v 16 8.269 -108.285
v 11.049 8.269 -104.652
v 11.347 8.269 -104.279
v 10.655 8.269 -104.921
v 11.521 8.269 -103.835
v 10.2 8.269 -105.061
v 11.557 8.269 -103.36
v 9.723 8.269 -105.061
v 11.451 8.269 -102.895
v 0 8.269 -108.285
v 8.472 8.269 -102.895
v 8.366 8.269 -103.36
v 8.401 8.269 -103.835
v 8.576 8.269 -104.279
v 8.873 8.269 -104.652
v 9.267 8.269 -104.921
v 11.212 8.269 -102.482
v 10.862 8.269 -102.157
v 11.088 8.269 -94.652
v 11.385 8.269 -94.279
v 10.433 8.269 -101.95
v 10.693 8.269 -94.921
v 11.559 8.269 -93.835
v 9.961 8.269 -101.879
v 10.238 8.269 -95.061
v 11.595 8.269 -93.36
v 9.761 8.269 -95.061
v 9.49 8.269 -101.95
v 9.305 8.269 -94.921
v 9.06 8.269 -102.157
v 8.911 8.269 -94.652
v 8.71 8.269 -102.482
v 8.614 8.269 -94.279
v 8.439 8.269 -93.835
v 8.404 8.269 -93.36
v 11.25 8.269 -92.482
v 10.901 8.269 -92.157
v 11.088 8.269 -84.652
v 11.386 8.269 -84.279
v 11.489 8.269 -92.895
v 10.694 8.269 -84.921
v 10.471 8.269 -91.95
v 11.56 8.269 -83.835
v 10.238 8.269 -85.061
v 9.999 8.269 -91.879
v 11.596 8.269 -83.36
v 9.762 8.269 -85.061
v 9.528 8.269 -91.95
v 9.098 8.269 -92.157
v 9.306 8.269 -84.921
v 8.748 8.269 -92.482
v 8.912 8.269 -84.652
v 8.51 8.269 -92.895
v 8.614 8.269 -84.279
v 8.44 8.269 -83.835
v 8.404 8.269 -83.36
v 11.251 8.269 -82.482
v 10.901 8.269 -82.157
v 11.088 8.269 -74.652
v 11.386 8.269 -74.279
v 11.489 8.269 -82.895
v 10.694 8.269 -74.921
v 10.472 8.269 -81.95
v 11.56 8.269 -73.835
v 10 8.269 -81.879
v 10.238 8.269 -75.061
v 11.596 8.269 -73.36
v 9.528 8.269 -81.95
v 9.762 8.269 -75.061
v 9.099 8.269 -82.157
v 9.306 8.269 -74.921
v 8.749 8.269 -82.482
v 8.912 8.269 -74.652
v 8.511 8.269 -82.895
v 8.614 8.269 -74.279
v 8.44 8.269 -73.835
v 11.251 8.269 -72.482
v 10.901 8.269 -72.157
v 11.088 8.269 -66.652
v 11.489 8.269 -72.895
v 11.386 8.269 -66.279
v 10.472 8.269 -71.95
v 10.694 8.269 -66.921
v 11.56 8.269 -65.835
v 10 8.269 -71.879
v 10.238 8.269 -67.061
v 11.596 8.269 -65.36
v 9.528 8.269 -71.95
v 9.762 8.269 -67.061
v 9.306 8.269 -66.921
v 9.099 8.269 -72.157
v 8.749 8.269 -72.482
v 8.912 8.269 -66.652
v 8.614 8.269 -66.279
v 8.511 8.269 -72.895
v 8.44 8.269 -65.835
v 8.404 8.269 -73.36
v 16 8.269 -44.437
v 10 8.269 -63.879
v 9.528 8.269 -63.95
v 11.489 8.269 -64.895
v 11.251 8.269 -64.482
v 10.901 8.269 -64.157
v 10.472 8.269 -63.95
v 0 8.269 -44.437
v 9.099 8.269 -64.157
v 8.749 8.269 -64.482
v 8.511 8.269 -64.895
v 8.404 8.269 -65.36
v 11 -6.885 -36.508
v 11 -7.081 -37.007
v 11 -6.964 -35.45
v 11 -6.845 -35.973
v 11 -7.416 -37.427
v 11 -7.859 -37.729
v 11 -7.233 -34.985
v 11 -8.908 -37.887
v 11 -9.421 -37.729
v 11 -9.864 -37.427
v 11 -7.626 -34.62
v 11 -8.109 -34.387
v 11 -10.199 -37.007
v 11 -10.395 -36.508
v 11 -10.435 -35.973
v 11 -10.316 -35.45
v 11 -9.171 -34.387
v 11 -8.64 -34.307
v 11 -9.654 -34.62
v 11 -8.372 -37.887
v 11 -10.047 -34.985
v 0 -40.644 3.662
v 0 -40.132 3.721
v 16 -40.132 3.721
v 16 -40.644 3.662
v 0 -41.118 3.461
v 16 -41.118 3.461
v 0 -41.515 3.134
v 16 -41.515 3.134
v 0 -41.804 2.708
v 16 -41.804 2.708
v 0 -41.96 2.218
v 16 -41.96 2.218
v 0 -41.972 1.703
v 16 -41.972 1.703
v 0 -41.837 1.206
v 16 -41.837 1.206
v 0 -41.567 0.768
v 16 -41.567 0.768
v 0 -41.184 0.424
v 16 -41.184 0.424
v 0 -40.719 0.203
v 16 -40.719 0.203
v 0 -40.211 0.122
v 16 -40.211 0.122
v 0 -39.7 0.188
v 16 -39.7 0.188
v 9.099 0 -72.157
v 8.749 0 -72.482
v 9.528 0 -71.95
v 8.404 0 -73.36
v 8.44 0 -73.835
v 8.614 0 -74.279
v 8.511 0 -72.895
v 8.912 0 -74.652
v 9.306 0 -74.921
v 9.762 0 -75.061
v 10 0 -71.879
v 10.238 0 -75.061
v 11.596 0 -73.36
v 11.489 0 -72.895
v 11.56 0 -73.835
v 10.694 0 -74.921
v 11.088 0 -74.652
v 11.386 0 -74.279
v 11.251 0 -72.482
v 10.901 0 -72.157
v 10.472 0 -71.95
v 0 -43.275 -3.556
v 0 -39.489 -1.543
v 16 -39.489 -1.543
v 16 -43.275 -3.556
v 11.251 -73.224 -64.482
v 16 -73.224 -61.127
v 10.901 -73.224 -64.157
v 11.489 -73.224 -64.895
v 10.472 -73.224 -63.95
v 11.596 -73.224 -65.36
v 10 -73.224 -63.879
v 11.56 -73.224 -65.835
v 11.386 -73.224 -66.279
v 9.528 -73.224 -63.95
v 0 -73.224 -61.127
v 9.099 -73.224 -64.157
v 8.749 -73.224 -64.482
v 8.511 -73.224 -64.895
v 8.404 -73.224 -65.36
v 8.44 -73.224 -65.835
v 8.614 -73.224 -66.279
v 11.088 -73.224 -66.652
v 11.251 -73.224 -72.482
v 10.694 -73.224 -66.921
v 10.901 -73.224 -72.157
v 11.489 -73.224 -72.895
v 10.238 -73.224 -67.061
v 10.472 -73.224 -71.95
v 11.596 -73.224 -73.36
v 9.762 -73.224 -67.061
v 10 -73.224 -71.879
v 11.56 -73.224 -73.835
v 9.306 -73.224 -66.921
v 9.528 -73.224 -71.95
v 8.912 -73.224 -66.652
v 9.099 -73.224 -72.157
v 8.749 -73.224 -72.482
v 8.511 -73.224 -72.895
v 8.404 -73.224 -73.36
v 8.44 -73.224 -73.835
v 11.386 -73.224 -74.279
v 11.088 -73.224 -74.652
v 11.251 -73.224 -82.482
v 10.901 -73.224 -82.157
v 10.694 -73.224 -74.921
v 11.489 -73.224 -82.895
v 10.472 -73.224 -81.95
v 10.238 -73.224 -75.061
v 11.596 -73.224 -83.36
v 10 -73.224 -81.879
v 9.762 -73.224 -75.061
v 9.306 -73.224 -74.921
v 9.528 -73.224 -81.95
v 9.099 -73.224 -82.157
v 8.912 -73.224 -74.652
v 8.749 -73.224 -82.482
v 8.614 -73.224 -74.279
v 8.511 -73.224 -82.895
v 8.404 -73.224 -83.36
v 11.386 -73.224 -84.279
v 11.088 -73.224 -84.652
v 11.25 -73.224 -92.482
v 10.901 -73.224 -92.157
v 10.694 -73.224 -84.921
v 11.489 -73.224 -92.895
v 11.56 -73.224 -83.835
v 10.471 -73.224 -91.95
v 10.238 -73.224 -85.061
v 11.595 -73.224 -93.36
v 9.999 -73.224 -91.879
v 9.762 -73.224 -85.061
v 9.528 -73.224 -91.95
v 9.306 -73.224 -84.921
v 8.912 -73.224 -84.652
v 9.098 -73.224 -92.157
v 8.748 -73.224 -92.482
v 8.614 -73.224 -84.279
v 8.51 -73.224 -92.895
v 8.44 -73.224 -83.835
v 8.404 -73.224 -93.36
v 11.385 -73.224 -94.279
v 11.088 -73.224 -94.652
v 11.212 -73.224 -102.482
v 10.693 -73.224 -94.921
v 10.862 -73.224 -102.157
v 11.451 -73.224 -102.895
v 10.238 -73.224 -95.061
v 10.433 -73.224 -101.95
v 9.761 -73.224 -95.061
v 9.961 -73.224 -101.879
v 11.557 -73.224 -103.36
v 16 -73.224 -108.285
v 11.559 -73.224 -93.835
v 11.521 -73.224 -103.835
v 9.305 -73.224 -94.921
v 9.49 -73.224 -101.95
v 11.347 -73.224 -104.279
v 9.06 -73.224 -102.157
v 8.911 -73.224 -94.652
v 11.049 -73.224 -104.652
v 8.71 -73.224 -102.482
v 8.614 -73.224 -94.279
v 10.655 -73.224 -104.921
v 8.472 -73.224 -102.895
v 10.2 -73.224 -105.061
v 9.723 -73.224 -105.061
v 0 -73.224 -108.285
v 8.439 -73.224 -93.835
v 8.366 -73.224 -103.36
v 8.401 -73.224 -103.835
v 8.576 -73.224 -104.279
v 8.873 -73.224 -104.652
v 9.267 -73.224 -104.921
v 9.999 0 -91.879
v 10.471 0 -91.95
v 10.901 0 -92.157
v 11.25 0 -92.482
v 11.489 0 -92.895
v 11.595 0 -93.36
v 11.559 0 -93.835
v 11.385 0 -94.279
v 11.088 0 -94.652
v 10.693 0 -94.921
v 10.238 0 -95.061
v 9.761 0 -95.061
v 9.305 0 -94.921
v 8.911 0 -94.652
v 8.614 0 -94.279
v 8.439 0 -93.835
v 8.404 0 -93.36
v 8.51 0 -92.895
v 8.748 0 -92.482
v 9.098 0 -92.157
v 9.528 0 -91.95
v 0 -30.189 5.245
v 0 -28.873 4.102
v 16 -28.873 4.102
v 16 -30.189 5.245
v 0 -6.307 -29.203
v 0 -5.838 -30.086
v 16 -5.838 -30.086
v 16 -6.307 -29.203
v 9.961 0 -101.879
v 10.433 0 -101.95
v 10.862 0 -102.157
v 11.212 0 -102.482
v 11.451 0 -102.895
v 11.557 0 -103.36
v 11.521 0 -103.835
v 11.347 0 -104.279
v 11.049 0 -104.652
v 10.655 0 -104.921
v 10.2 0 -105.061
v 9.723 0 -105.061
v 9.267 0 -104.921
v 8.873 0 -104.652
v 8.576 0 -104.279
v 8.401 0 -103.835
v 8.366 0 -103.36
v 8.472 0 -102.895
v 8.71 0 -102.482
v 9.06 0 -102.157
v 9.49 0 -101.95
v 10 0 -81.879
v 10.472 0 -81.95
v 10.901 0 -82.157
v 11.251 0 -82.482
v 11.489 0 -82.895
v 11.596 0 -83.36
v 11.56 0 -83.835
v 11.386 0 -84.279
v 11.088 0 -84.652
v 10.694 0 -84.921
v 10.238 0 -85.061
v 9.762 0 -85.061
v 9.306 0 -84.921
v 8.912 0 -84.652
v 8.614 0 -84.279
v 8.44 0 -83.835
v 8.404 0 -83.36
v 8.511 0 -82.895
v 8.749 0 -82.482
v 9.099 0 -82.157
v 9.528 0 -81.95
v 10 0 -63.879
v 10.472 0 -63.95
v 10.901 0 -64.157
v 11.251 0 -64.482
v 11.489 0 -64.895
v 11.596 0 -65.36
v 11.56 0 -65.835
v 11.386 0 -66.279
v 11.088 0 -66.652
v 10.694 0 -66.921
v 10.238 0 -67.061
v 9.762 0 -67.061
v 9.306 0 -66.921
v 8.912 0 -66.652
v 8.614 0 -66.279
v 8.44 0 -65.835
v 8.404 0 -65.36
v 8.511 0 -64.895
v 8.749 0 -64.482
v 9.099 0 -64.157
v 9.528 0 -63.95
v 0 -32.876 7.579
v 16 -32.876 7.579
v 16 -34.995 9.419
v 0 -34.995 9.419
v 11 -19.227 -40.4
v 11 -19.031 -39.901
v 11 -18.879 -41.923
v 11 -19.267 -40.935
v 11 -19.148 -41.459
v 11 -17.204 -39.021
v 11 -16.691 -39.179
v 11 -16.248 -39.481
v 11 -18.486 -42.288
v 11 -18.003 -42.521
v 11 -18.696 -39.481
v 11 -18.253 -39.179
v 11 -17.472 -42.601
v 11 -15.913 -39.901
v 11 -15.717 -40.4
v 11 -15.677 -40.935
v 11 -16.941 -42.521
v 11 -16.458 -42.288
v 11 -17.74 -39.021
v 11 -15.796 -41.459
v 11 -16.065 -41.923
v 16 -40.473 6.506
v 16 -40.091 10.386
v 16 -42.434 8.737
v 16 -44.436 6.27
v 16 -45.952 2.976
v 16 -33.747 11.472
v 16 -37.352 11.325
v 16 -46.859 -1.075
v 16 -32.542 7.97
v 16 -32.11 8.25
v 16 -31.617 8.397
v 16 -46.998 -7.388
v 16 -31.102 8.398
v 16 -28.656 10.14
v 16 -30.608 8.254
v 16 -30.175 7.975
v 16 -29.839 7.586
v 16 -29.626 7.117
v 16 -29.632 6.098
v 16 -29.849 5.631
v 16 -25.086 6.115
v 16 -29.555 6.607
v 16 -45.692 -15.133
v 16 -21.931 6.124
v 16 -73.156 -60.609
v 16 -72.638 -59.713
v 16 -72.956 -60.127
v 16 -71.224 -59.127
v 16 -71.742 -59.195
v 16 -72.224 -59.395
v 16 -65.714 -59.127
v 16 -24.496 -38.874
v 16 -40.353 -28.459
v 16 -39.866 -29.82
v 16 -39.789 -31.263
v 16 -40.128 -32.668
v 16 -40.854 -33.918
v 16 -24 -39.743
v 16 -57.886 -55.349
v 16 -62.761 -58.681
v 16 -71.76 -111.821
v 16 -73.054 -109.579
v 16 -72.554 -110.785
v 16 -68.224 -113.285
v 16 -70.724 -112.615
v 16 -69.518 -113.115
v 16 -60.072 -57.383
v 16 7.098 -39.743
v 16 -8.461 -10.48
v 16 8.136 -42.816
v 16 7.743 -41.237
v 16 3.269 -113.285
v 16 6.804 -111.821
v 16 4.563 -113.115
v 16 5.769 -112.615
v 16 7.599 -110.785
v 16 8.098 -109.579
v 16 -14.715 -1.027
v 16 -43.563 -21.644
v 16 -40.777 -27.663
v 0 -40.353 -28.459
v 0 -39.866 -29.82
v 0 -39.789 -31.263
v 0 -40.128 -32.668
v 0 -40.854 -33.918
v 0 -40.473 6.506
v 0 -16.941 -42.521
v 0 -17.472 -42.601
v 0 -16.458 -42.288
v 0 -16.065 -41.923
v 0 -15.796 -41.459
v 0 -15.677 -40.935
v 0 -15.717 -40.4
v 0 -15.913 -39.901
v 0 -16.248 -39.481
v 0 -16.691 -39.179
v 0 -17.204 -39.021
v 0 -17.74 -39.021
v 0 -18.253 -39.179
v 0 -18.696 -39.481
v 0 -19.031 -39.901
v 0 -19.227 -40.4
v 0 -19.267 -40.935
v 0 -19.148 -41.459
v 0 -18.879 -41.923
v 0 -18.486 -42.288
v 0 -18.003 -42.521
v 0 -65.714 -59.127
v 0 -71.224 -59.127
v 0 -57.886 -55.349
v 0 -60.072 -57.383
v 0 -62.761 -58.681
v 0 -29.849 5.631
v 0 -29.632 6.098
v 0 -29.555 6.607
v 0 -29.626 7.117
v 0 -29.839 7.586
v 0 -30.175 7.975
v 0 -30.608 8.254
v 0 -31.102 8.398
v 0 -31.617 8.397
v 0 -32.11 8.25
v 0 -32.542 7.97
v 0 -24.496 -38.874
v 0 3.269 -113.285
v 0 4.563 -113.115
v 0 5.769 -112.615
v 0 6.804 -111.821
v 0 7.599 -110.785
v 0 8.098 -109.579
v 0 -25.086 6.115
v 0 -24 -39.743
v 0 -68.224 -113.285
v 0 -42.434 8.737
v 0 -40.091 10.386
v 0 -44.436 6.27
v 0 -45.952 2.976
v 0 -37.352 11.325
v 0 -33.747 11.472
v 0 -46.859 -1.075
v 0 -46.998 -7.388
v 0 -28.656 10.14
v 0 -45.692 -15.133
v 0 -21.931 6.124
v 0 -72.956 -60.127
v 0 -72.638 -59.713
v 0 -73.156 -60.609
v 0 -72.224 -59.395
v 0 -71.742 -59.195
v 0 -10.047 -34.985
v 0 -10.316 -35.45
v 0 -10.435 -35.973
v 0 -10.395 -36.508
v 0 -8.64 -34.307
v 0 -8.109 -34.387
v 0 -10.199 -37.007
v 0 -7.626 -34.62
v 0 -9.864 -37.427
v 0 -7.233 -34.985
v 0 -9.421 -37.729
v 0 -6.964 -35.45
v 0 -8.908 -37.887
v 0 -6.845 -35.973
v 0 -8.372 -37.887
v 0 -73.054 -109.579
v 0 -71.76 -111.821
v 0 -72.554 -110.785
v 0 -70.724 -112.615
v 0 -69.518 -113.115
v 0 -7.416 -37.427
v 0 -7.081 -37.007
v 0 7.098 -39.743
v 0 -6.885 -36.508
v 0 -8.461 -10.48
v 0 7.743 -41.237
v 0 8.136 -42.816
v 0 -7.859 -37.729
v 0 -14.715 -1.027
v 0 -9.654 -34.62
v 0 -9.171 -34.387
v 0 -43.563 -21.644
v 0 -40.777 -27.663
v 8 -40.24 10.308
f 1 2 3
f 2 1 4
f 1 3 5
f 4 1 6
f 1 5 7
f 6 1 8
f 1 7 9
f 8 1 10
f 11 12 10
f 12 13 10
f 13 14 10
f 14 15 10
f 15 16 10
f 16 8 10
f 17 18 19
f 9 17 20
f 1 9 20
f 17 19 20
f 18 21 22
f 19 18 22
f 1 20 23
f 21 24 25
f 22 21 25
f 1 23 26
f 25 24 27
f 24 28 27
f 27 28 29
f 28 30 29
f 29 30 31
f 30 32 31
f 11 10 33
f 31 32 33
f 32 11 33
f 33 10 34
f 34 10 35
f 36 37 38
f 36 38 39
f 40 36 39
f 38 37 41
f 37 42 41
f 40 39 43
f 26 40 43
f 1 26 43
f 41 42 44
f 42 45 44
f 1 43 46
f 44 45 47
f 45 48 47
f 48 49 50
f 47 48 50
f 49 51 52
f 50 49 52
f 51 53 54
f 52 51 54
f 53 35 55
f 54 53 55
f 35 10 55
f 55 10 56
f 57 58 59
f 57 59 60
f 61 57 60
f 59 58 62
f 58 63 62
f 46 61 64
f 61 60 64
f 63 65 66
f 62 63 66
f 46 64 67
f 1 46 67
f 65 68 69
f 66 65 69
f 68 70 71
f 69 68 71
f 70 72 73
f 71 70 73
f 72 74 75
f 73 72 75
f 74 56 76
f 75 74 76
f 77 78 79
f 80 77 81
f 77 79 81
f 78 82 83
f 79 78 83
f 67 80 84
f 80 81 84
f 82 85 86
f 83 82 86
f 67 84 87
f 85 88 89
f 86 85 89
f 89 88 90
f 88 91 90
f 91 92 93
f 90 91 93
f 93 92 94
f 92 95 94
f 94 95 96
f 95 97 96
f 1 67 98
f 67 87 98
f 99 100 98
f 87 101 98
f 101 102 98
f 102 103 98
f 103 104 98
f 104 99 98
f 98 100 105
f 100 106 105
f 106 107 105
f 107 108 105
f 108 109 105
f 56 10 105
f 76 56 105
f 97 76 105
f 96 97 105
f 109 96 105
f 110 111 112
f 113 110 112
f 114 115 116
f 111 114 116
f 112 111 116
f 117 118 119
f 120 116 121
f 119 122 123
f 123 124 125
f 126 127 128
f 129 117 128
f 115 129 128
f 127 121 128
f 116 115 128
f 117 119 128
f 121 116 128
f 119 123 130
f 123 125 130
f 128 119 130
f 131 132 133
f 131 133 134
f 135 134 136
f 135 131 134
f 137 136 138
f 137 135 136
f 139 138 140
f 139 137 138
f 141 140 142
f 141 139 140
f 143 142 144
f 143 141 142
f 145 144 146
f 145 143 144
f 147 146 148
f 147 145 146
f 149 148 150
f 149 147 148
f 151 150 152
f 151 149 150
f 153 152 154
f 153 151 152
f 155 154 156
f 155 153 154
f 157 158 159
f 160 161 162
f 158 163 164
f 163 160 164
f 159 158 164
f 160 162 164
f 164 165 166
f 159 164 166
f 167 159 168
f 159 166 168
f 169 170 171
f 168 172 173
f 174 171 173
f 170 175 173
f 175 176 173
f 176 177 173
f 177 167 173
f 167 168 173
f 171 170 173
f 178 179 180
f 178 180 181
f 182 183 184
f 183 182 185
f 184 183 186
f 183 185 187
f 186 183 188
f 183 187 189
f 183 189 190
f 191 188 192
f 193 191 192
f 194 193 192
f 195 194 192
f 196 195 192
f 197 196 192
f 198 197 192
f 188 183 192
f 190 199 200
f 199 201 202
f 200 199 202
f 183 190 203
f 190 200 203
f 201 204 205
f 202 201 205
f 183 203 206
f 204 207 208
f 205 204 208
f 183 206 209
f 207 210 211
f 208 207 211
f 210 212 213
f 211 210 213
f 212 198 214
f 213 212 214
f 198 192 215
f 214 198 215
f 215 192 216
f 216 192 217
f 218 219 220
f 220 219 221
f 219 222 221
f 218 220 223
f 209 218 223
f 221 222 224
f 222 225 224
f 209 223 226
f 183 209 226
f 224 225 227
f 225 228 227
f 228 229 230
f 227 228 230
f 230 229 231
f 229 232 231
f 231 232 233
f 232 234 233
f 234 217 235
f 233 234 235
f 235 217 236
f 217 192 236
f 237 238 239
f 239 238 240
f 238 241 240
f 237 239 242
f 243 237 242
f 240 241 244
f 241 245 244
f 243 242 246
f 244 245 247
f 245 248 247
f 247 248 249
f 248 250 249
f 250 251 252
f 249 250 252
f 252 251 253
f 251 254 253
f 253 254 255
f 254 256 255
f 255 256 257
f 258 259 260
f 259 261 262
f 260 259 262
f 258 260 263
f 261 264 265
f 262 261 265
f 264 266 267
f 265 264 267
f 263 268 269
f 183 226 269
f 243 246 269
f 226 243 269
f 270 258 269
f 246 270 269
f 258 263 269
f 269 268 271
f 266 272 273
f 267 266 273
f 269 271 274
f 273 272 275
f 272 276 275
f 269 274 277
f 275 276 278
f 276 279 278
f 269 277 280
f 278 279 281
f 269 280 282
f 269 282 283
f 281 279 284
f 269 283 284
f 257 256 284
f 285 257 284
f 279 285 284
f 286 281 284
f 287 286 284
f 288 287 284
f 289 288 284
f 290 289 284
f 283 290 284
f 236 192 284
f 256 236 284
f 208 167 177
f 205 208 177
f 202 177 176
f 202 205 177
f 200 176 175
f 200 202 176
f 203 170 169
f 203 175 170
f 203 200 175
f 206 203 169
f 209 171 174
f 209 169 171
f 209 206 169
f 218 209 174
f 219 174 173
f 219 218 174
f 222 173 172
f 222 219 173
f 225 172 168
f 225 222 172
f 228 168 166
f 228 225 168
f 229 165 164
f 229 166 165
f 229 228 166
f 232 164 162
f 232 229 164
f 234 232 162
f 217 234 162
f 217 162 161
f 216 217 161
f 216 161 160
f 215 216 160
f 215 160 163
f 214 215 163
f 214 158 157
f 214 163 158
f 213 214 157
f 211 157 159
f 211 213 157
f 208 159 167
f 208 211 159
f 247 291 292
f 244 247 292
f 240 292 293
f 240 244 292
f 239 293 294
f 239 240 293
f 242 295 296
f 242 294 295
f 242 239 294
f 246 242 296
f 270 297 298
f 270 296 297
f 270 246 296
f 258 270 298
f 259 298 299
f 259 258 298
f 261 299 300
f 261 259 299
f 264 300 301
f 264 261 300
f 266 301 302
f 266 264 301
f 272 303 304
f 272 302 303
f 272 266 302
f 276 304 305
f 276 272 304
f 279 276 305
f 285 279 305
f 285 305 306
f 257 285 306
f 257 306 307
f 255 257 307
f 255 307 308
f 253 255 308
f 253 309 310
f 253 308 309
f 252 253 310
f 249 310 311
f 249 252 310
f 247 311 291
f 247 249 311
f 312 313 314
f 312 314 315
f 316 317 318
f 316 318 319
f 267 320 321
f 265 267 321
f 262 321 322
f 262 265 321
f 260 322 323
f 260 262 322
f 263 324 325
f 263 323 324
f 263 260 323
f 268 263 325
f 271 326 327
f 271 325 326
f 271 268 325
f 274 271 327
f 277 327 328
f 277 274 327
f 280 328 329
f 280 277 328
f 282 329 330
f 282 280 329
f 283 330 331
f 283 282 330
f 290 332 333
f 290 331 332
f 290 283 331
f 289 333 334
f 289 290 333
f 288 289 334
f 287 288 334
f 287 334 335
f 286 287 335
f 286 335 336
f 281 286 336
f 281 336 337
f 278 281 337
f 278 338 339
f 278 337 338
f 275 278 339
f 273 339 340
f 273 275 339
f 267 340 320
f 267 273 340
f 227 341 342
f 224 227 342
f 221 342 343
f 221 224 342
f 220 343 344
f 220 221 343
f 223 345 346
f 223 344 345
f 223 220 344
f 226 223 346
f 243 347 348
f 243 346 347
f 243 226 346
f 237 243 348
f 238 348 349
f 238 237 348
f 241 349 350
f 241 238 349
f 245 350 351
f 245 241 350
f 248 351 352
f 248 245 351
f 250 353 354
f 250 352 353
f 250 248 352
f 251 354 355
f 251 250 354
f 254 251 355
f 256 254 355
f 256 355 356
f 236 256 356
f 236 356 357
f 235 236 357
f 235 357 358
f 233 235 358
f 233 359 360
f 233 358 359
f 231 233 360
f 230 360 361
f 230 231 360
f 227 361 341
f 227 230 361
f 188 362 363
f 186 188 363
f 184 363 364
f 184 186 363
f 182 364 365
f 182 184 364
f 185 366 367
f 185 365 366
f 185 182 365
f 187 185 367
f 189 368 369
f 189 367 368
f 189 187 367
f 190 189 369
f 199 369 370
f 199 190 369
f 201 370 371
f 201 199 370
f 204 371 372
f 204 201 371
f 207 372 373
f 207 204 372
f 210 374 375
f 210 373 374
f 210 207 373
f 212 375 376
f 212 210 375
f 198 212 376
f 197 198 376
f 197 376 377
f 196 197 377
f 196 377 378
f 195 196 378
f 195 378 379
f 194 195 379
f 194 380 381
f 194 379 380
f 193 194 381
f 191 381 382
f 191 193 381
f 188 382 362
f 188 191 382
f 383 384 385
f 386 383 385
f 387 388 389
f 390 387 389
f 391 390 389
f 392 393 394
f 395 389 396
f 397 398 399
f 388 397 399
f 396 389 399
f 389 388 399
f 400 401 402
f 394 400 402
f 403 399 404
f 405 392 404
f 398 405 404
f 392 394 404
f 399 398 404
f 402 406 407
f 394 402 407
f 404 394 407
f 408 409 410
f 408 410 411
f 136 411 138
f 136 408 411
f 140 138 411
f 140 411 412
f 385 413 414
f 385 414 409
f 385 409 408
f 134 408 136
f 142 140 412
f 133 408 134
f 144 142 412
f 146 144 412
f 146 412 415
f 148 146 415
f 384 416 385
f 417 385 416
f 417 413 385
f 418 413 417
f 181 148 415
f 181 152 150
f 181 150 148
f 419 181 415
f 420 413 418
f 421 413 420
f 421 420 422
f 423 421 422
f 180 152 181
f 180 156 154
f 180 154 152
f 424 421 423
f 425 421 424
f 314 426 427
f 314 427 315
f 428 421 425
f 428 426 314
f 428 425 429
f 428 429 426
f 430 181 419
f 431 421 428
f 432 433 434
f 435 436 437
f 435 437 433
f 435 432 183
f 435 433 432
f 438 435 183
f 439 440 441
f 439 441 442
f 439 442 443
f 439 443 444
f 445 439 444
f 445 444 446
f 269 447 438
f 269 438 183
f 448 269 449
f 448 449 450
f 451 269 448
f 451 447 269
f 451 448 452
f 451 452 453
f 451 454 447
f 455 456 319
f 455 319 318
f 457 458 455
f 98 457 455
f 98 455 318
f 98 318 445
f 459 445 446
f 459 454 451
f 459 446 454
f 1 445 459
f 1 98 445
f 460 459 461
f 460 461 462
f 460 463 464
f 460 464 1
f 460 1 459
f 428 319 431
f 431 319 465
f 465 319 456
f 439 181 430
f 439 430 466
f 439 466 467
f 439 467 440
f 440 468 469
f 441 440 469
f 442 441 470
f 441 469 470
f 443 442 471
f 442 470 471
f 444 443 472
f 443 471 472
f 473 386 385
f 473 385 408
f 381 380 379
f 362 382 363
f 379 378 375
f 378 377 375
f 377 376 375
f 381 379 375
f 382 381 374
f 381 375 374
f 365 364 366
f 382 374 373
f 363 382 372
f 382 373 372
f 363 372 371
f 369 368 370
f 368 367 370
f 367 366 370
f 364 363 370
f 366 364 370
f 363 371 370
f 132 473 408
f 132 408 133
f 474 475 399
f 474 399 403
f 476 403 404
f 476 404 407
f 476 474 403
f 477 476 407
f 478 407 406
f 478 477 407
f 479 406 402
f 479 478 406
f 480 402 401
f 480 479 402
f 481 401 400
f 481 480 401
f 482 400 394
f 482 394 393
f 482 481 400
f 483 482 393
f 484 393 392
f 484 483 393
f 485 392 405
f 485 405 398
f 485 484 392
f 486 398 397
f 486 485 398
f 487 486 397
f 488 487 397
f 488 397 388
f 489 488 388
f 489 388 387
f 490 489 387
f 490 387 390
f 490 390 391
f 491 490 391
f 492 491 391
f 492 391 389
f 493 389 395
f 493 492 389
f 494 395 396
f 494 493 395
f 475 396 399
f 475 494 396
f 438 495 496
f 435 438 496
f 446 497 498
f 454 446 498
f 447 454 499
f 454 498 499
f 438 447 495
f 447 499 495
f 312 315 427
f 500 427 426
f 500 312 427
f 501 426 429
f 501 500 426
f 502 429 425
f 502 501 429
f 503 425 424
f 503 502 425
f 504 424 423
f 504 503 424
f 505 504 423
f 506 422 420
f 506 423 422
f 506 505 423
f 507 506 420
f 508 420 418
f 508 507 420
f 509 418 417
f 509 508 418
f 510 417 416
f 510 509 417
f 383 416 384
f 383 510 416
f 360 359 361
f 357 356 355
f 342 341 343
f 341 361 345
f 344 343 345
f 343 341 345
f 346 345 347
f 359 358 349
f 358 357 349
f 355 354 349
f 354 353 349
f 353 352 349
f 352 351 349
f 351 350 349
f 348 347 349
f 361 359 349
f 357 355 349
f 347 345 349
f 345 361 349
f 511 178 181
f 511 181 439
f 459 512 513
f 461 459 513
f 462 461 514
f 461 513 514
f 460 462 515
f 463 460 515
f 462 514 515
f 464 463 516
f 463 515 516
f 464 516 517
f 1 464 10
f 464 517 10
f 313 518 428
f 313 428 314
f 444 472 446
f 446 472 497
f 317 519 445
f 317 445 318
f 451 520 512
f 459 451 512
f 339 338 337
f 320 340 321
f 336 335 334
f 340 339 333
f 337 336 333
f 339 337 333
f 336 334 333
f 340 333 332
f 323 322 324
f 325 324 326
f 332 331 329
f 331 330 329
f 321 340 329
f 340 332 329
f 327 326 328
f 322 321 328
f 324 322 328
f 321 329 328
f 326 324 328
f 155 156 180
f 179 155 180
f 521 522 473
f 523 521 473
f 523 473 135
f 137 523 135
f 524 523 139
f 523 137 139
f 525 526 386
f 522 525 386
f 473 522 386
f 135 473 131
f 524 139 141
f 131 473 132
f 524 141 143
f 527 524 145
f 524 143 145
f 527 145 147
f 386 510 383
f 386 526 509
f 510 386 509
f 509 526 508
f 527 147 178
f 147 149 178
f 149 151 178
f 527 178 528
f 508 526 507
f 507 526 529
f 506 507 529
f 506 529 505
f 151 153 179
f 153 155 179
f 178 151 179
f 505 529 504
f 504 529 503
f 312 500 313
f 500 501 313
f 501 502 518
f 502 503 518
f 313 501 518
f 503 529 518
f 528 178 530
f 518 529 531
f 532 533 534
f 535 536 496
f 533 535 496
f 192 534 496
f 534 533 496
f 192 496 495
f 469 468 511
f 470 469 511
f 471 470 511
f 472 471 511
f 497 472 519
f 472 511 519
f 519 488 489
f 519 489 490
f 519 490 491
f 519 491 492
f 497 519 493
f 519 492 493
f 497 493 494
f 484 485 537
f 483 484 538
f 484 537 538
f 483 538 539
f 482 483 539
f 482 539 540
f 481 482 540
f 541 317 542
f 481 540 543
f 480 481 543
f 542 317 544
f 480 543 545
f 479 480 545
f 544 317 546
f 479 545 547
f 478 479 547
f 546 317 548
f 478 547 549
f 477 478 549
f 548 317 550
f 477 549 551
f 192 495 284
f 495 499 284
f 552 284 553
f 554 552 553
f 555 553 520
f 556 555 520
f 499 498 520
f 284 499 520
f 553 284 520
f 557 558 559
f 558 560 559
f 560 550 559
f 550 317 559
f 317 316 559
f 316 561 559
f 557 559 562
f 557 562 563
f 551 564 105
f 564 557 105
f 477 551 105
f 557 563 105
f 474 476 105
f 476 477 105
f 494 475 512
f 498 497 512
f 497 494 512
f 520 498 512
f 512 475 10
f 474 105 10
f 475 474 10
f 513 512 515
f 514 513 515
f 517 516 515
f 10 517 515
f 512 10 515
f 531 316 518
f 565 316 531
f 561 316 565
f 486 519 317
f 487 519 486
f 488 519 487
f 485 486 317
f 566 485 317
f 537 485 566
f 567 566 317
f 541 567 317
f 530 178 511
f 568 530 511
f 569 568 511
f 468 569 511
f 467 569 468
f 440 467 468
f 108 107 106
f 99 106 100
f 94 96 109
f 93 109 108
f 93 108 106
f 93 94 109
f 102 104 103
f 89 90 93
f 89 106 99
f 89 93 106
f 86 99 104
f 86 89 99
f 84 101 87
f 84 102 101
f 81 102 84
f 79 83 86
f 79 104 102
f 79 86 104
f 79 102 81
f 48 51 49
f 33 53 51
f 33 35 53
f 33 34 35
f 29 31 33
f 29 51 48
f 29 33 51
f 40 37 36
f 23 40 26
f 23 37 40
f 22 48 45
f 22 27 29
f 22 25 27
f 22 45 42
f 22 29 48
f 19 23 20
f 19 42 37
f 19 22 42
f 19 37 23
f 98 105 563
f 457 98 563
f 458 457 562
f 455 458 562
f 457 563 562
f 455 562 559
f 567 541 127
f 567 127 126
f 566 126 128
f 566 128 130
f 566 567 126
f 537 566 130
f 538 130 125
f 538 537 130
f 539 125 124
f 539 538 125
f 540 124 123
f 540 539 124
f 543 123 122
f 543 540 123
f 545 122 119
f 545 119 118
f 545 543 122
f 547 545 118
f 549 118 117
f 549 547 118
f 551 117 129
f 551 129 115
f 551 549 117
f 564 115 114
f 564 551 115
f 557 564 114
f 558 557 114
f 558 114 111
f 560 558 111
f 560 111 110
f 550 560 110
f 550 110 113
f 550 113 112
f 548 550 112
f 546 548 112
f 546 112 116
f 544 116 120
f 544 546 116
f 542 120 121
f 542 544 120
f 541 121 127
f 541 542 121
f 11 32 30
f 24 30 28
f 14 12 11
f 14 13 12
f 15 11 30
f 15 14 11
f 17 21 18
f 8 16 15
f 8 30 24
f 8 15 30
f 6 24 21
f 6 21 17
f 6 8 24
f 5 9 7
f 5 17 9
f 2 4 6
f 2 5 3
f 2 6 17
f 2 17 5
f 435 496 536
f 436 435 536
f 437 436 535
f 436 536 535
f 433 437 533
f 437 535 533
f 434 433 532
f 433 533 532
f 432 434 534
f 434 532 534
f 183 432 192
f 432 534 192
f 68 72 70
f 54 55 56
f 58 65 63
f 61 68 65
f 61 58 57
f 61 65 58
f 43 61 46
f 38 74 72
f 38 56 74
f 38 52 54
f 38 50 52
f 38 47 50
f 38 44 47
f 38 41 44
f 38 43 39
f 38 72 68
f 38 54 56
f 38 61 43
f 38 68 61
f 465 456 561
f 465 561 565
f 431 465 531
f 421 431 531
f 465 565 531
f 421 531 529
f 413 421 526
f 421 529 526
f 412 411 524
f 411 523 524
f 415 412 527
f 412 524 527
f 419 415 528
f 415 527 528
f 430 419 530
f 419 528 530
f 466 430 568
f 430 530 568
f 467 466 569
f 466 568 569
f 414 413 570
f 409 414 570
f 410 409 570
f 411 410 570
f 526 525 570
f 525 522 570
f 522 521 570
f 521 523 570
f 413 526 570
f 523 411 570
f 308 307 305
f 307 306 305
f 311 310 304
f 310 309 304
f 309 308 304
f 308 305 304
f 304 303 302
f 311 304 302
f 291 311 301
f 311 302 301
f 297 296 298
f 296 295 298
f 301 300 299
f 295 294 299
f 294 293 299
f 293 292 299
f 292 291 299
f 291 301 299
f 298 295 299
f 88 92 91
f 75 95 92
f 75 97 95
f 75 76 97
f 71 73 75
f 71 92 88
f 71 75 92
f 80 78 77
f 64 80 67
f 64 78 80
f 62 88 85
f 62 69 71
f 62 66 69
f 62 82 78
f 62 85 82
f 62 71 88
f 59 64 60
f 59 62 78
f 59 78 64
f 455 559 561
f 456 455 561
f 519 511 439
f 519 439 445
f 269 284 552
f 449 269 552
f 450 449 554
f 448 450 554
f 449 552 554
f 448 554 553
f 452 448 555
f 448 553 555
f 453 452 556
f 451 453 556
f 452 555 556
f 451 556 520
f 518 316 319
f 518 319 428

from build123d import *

# Parameters (mm, degrees)
EXTRUDE_1_DEPTH          = 16
SKETCH_1_12_R            = 1.8
CUT_EXTRUDE_3_DEPTH      = 11
CUT_EXTRUDE_5_DEPTH      = 136.835525964
CUT_EXTRUDE_5_DEPTH_BACK = 136.835525964
SKETCH_3_R               = 1.6
SKETCH_5_W               = 11.148525628
SKETCH_5_H               = 46.436292238
EXTRUDE_5_DEPTH          = 8.268698
CUT_EXTRUDE_7_DEPTH      = 20


with BuildPart() as part:
    # 草图1 → 凸台-拉伸1 (new body)
    with BuildSketch(Plane(origin=(0, 0, 0), x_dir=(0, 0, -1), z_dir=(1, 0, 0))):
        with BuildLine():
            Line((59.126763237, -65.71435988), (59.126763237, -71.224186709))
            ThreePointArc((59.126763237, -71.224186709), (59.712549674, -72.638400271), (61.126763237, -73.224186709))
            Line((61.126763237, -73.224186709), (108.285076486, -73.224186709))
            ThreePointArc((108.285076486, -73.224186709), (111.820610392, -71.759720614), (113.285076486, -68.224186709))
            Line((113.285076486, -68.224186709), (113.285076486, 3.268698301))
            ThreePointArc((113.285076486, 3.268698301), (111.820610392, 6.804232207), (108.285076486, 8.268698301))
            Line((108.285076486, 8.268698301), (44.437384067, 8.268698301))
            ThreePointArc((44.437384067, 8.268698301), (42.018165111, 7.971655564), (39.742668439, 7.098174229))
            Line((39.742668439, 7.098174229), (10.48020136, -8.46095551))
            add(Edge.make_bspline(
                [(10.48020136, -8.46095551), (-18.899584584, -24.082464797), (-10.308254985, -40.240405746), (-1.716925386, -56.398346695), (27.662860558, -40.776837409)],
                knots=[1.570796327, 1.570796327, 1.570796327, 3.141592654, 3.141592654, 4.71238898, 4.71238898, 4.71238898], degree=2, weights=[1, 0.707106781, 1, 0.707106781, 1]))
            Line((27.662860558, -40.776837409), (28.45929676, -40.353364768))
            ThreePointArc((28.45929676, -40.353364768), (31.26308739, -39.788979408), (33.917537352, -40.853717936))
            Line((33.917537352, -40.853717936), (55.348528793, -57.885590286))
            ThreePointArc((55.348528793, -57.885590286), (58.132807195, -61.367962267), (59.126763237, -65.71435988))
        make_face()
    extrude(amount=EXTRUDE_1_DEPTH)

    # 草图1<12> → 切除-拉伸3 (cut)
    with BuildSketch(Plane(origin=(0, 0, 0), x_dir=(0, 0, -1), z_dir=(1, 0, 0))):
        with Locations((40.800977433, -17.471989752)):
            Circle(SKETCH_1_12_R)
        with Locations(Location((36.107251708, -8.64005263, 0), (0, 0, 180))):
            Circle(SKETCH_1_12_R)
    extrude(amount=CUT_EXTRUDE_3_DEPTH, mode=Mode.SUBTRACT)

    # 草图3 → 切除-拉伸5 (cut, two sides: drawn at the far end of the back side and taken through both)
    with BuildSketch(Plane(origin=(0, 0, 0), x_dir=(1, 0, 0), z_dir=(0, 1, 0)).offset(-CUT_EXTRUDE_5_DEPTH_BACK)):
        with Locations(Location((9.961161351, 103.479269729, 0), (0, 0, 270))):
            Circle(SKETCH_3_R)
        with Locations(Location((9.999259871, 93.479342304, 0), (0, 0, 270))):
            Circle(SKETCH_3_R)
        with Locations(Location((9.999985896, 83.47934233, 0), (0, 0, 270))):
            Circle(SKETCH_3_R)
        with Locations(Location((9.999999731, 73.47934233, 0), (0, 0, 270))):
            Circle(SKETCH_3_R)
        with Locations(Location((9.999999994, 65.47934233, 0), (0, 0, 270))):
            Circle(SKETCH_3_R)
    extrude(amount=CUT_EXTRUDE_5_DEPTH + CUT_EXTRUDE_5_DEPTH_BACK, mode=Mode.SUBTRACT)

    # 草图5 → 凸台-拉伸5 (add, through all)
    with BuildSketch(Plane(origin=(0, 0, 0), x_dir=(1, 0, 0), z_dir=(0, 1, 0))):
        with Locations((9.530048776, 84.64819368)):
            Rectangle(SKETCH_5_W, SKETCH_5_H)
    extrude(amount=EXTRUDE_5_DEPTH)

    # 草图1<19> → 切除-拉伸7 (cut)
    with BuildSketch(Plane(origin=(0, 0, 0), x_dir=(0, 0, -1), z_dir=(1, 0, 0))):
        with BuildLine():
            Line((-6.115071551, -25.08624568), (-4.101865535, -28.872535514))
            Line((-4.101865535, -28.872535514), (-5.245216271, -30.189046212))
            ThreePointArc((-5.245216271, -30.189046212), (-7.975277848, -30.175074758), (-7.578978461, -32.87625565))
            Line((-7.578978461, -32.87625565), (-9.418626951, -34.994518089))
            Line((-9.418626951, -34.994518089), (-6.505612199, -40.473102026))
            Line((-6.505612199, -40.473102026), (-3.720774668, -40.132481631))
            ThreePointArc((-3.720774668, -40.132481631), (-1.703002024, -41.971509898), (-0.187953824, -39.700373538))
            Line((-0.187953824, -39.700373538), (1.542836627, -39.488676259))
            Line((1.542836627, -39.488676259), (3.556042643, -43.274966093))
            Line((3.556042643, -43.274966093), (38.873946357, -24.496103581))
            Line((38.873946357, -24.496103581), (39.742668439, -23.999877724))
            Line((39.742668439, -23.999877724), (30.085779757, -5.837911606))
            Line((30.085779757, -5.837911606), (29.202832164, -6.307383168))
            Line((29.202832164, -6.307383168), (-6.115071551, -25.08624568))
        make_face()
    extrude(amount=CUT_EXTRUDE_7_DEPTH, mode=Mode.SUBTRACT)


solid = part.part
